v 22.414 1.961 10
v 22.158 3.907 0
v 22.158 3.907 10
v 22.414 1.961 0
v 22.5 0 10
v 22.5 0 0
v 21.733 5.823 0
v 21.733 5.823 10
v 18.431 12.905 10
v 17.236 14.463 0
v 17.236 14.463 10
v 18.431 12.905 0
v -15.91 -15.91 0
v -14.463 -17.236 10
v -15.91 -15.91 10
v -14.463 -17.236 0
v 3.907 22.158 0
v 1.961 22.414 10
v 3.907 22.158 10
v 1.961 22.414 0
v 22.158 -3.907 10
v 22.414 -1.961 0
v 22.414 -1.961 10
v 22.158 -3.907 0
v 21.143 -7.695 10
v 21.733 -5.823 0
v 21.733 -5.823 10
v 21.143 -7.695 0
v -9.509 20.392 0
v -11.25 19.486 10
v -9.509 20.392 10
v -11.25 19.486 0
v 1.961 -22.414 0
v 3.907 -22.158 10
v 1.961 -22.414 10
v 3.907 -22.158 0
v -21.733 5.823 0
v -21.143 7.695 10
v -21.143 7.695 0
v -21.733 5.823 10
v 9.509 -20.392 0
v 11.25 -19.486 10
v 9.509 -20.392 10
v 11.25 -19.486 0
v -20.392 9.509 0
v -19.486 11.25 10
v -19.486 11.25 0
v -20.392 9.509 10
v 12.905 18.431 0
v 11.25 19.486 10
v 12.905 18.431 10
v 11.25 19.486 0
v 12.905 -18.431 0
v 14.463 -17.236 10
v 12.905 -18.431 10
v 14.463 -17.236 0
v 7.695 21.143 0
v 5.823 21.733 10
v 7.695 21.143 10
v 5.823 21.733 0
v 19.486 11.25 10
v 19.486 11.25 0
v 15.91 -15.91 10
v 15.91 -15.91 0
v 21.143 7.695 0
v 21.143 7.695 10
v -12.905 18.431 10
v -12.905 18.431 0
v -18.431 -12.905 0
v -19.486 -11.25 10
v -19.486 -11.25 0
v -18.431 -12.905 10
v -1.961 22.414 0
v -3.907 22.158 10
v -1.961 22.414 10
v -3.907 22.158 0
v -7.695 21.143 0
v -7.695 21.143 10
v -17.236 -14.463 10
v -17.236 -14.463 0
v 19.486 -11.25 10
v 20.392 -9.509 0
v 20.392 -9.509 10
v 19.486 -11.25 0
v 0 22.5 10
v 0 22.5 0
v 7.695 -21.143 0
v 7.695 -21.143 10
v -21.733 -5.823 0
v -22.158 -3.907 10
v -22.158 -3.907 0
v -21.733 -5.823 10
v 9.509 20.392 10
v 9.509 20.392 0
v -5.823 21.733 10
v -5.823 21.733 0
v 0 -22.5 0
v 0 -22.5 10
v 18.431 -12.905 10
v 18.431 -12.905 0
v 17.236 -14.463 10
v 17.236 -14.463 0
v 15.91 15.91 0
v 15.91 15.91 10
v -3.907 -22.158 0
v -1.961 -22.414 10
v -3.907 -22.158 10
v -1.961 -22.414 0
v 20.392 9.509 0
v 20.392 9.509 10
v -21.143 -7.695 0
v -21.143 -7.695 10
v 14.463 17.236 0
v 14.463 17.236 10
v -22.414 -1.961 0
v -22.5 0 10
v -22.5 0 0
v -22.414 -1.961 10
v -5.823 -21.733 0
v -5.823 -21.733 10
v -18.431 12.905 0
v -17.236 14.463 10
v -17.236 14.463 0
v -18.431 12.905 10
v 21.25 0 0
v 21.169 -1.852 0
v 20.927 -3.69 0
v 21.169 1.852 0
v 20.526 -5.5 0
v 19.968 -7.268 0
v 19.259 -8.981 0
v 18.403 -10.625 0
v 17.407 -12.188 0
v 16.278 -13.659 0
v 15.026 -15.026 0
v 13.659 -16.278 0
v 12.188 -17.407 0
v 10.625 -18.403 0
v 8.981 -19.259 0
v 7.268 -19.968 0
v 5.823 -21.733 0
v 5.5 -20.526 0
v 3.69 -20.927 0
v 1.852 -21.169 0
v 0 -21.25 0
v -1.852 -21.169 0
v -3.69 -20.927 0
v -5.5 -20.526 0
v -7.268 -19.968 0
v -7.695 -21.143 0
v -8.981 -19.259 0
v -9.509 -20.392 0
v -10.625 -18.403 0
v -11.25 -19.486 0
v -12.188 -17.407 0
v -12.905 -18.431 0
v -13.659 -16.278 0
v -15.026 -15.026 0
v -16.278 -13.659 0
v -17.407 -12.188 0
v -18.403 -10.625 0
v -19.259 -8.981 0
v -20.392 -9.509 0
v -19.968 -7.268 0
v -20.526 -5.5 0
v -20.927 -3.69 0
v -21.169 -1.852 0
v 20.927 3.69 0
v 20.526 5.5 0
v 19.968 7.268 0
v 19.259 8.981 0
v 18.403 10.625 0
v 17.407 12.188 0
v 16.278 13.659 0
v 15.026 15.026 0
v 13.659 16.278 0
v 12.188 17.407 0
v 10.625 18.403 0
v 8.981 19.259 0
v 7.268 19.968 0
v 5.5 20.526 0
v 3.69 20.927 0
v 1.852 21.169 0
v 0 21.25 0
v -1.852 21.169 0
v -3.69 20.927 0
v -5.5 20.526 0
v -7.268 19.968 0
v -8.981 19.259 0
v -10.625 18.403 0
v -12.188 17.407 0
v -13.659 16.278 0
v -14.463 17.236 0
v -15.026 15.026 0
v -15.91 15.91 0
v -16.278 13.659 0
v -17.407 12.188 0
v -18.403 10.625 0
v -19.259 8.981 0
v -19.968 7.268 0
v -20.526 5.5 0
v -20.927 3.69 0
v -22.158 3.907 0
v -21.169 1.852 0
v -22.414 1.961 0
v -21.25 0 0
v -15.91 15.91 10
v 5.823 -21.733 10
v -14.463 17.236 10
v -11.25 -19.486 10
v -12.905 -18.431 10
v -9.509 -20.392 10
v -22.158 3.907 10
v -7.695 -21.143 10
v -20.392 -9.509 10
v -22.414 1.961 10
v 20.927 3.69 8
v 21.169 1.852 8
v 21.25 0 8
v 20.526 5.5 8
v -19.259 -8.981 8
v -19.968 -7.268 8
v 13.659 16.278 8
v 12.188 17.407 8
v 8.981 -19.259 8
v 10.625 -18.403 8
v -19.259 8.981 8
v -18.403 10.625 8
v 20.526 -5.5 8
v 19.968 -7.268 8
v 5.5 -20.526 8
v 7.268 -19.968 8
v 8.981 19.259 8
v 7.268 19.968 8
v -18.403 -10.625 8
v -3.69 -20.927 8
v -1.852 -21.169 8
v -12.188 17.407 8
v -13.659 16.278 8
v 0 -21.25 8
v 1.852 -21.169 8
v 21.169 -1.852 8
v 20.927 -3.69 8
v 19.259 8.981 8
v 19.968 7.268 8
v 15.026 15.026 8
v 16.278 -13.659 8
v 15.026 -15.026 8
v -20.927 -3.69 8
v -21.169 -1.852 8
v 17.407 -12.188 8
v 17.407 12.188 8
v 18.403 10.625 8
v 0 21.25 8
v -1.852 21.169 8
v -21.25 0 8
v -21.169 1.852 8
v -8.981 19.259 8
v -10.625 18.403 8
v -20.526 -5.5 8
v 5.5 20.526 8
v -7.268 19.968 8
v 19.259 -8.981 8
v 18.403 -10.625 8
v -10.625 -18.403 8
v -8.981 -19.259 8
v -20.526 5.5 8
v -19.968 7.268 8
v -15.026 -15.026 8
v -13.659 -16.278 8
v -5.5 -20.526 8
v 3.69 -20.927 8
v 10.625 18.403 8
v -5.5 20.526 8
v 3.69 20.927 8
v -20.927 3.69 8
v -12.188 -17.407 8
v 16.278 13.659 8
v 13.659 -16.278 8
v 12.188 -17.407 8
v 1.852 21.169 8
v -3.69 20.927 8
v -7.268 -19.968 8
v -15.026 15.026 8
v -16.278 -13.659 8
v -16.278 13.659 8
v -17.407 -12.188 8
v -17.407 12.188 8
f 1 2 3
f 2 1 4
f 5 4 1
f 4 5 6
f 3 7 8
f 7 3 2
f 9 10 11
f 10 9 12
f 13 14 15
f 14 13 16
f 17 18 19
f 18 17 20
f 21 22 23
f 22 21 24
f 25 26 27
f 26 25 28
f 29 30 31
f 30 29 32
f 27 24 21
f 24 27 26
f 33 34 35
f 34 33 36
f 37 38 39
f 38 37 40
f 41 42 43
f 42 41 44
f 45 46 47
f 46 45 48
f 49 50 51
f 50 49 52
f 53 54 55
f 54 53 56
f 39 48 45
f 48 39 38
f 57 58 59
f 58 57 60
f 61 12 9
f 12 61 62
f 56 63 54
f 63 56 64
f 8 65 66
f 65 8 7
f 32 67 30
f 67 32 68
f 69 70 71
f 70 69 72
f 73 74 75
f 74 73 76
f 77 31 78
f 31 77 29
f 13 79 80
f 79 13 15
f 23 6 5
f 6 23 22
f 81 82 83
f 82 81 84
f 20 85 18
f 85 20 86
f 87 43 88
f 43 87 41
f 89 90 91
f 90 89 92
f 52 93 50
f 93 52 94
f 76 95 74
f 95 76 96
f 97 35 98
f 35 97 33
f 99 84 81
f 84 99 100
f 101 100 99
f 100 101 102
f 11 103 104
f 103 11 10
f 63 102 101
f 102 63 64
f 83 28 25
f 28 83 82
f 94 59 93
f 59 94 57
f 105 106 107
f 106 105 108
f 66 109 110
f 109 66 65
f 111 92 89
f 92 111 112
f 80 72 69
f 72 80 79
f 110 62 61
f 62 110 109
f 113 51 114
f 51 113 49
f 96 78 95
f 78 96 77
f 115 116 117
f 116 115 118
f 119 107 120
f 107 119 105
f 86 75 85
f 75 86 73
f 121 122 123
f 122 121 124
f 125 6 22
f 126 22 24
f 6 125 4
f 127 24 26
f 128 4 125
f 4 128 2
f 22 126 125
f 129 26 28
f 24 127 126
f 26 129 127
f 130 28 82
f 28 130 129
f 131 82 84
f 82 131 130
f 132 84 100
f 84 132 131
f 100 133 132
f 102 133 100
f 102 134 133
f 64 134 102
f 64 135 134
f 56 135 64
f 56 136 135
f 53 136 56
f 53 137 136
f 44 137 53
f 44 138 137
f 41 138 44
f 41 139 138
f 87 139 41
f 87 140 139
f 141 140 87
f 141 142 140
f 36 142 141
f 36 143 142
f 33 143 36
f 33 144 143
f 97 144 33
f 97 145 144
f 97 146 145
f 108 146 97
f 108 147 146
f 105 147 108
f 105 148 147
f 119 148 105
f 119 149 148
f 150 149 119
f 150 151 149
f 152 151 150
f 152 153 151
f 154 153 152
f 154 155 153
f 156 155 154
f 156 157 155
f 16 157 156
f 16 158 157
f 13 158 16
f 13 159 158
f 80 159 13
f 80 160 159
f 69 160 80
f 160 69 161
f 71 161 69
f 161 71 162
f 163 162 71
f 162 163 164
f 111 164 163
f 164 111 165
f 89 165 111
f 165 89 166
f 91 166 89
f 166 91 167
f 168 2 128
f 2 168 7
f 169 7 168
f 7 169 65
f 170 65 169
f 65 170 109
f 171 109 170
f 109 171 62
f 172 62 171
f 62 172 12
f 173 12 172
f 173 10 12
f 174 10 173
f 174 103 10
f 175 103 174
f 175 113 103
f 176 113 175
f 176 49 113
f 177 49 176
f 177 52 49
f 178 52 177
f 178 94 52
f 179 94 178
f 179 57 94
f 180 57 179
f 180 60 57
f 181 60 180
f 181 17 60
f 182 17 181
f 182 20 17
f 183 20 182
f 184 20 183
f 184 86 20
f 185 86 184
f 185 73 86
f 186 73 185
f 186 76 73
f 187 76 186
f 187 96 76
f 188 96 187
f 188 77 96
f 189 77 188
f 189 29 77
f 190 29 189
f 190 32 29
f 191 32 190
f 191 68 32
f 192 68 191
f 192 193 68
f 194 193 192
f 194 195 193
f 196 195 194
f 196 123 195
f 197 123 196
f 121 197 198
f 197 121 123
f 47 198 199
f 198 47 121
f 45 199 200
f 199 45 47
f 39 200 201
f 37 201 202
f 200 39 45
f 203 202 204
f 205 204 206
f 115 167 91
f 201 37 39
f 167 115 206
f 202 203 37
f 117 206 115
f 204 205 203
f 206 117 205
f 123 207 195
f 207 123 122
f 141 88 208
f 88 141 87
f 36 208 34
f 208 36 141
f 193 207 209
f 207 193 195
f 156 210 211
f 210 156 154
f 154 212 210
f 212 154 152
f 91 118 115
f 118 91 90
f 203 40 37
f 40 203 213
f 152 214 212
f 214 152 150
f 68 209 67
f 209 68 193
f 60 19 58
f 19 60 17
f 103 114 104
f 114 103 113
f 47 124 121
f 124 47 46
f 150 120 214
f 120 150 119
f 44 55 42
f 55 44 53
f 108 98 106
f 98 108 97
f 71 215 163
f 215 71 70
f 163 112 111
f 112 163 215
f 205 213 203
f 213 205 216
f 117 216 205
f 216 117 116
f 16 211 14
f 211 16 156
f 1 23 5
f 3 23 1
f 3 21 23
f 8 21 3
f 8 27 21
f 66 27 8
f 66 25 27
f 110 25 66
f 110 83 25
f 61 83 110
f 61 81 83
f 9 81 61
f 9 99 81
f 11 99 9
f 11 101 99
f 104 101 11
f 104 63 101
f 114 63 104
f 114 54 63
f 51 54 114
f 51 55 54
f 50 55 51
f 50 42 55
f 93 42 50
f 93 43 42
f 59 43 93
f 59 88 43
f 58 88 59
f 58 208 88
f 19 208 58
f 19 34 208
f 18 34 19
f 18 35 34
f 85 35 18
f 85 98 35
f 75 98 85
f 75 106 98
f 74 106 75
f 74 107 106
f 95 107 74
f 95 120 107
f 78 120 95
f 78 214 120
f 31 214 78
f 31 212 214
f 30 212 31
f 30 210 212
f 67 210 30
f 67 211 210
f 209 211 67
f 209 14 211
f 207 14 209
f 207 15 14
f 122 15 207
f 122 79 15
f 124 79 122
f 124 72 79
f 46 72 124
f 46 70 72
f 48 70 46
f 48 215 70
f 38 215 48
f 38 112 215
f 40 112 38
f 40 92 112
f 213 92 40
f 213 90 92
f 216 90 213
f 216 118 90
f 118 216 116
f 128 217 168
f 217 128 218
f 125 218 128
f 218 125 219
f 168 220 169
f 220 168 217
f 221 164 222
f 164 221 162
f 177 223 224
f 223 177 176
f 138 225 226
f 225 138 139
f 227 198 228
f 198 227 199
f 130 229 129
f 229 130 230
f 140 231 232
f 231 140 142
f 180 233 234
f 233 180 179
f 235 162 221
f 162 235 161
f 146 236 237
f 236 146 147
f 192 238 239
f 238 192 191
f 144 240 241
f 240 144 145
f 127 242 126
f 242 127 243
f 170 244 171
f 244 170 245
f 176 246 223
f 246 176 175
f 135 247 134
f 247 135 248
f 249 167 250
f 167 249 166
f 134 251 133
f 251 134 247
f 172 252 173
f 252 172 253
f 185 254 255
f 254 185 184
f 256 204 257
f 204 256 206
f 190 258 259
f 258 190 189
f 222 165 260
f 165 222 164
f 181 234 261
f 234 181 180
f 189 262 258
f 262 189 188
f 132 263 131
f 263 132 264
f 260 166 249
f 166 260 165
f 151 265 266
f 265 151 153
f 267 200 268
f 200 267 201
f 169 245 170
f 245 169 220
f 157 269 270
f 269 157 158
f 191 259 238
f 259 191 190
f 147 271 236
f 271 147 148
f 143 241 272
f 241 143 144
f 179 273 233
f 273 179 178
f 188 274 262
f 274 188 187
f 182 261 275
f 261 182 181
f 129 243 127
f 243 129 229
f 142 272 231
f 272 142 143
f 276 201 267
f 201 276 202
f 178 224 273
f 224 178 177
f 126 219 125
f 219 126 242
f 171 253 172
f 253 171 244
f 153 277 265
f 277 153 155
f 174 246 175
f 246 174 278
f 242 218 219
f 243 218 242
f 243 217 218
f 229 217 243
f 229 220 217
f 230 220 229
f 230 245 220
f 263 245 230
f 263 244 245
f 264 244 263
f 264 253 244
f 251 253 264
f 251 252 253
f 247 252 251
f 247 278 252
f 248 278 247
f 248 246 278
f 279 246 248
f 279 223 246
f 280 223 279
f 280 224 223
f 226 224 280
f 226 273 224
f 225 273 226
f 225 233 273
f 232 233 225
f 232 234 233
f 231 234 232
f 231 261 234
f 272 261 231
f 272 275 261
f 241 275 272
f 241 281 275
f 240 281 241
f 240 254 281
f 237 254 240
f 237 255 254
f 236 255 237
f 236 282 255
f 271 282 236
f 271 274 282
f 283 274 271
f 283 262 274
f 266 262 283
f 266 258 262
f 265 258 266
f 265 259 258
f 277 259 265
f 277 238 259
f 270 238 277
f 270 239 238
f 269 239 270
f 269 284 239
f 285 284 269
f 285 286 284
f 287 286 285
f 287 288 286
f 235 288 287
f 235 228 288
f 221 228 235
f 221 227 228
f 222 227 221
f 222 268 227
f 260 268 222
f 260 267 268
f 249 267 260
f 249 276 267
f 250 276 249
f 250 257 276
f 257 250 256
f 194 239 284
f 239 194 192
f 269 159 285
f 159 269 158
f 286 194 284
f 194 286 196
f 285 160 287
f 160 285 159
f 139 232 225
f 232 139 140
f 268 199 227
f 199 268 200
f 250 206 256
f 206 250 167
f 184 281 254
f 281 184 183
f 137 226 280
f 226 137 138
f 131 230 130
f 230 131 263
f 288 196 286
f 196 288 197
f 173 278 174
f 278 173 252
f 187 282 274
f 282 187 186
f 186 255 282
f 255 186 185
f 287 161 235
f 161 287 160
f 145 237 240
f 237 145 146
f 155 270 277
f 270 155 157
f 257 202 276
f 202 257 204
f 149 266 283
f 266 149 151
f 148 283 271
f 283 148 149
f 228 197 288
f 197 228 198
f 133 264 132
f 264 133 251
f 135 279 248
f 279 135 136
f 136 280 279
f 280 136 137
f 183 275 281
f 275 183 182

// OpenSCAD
// Cap for the metal rods in the garden.

difference() {
    cylinder(r=22.5, h=10, $fn=72);
    cylinder(r=21.25, h=8, $fn=72);    
}
